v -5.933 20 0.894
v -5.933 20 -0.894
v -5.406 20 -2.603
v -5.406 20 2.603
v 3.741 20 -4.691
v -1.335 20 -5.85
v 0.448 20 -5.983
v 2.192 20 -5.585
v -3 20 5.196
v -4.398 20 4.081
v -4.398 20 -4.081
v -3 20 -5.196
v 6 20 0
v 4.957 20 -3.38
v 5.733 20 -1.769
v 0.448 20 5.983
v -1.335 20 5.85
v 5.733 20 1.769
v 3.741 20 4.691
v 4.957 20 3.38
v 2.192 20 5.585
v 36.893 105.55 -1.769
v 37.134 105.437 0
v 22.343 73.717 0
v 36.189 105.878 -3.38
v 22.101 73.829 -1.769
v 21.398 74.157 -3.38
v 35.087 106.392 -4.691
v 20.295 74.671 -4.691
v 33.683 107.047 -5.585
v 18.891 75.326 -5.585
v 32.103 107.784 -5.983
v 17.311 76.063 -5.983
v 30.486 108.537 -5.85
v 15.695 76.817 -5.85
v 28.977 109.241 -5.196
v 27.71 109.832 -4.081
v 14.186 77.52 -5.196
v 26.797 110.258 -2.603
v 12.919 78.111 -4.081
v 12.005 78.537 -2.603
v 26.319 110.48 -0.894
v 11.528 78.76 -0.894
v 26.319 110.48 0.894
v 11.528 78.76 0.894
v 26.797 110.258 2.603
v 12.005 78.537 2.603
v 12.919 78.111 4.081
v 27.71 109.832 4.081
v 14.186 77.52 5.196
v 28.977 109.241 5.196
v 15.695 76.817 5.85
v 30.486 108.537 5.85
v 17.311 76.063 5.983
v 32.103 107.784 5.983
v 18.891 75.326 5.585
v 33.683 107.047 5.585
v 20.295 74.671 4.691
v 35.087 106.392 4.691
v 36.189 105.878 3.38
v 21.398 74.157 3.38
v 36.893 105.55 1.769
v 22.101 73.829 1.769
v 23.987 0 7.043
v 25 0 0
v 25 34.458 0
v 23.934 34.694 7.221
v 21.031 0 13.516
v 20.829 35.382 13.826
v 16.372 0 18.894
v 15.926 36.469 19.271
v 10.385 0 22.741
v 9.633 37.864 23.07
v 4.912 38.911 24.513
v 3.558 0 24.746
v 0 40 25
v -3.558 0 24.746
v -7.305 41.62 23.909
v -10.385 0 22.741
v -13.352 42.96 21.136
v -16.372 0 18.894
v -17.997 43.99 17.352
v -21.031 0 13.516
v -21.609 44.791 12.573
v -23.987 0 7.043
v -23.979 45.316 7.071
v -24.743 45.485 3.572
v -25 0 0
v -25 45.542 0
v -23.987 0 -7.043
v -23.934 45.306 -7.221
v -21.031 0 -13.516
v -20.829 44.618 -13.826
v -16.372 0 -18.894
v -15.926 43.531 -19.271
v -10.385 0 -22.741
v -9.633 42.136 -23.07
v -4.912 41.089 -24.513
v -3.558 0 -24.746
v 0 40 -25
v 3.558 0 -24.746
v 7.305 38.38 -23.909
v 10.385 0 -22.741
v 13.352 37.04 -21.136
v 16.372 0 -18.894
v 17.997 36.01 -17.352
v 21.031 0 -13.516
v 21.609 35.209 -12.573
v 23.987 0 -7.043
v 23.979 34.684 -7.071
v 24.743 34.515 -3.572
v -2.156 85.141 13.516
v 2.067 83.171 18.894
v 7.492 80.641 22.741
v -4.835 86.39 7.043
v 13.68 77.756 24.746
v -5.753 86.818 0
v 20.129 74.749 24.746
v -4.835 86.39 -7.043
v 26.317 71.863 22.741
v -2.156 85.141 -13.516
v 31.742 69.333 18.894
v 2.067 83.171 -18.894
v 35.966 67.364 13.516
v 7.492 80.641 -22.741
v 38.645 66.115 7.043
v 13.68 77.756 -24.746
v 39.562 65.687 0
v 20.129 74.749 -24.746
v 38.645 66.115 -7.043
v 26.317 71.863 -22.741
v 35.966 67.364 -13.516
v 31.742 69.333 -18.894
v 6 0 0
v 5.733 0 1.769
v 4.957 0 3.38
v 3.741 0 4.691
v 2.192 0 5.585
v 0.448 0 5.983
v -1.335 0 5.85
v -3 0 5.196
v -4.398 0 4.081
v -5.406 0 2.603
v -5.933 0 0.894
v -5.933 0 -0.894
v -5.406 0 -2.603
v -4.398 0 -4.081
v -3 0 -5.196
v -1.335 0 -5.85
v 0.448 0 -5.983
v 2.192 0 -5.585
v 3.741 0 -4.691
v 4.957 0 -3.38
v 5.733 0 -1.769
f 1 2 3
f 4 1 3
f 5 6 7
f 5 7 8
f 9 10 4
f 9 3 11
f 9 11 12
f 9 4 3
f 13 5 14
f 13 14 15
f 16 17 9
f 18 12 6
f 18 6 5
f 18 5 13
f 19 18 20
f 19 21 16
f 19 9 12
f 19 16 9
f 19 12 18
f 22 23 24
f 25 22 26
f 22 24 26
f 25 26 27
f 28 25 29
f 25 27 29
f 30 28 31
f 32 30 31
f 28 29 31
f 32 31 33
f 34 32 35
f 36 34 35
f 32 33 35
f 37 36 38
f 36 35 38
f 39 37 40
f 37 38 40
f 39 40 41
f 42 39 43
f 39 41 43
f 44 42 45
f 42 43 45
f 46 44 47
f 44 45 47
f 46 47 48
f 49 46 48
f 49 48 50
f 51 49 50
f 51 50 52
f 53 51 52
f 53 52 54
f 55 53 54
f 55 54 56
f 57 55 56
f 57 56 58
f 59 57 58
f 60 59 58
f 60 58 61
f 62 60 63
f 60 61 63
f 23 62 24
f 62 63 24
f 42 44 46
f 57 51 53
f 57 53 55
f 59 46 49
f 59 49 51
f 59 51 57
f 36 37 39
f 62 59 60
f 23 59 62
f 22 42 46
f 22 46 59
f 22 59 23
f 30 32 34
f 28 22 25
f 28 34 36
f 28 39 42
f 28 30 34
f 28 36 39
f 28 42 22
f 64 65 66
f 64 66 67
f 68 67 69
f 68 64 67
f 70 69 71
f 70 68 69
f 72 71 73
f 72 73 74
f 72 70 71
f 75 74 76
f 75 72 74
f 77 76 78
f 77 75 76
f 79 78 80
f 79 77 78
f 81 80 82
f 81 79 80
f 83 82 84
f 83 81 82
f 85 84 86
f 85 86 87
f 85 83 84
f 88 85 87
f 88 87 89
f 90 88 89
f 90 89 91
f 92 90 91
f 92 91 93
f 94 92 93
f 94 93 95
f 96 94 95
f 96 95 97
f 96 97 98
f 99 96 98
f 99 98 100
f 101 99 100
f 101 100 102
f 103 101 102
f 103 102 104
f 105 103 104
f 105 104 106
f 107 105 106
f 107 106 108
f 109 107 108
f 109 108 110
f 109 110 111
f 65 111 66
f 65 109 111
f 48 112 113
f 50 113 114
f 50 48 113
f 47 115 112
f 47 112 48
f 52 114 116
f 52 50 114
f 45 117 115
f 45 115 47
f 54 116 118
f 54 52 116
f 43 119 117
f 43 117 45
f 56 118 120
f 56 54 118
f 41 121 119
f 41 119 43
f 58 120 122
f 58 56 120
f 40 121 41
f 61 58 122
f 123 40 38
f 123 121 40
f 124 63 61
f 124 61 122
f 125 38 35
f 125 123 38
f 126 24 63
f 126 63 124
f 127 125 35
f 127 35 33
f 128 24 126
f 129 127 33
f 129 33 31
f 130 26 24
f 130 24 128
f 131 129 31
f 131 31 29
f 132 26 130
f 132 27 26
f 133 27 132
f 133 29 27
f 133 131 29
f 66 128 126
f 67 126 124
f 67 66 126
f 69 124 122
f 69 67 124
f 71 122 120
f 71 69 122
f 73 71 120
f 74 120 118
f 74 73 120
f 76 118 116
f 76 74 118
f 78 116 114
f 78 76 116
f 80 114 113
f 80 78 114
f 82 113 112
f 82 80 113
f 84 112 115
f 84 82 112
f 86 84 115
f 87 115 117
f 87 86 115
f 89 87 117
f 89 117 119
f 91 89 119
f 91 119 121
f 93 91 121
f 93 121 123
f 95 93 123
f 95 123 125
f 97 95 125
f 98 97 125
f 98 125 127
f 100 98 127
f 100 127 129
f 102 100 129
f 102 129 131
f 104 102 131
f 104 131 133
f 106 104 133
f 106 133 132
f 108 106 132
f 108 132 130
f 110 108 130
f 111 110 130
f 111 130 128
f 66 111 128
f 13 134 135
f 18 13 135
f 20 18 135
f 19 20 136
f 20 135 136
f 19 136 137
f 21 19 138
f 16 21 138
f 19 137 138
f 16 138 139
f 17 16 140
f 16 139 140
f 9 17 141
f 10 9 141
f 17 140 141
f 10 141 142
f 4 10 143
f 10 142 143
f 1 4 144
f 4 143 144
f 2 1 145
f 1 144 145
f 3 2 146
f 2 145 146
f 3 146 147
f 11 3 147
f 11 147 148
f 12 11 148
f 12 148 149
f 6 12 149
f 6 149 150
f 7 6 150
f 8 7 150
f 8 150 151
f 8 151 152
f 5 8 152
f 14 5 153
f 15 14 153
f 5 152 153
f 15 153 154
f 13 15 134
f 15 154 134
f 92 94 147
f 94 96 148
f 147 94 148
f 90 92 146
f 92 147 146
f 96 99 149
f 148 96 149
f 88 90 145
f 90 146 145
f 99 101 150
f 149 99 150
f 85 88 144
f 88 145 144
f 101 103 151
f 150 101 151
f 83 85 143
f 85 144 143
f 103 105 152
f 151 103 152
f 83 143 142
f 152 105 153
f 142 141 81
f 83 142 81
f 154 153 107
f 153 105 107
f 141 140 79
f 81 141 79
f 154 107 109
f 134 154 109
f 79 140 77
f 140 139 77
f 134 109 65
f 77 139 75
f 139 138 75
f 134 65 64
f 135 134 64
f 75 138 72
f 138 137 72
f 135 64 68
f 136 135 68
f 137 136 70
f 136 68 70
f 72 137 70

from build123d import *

# Parameters (mm, degrees)
ESBO_O2_R                = 25
ESBO_O3_R                = 6
RESSALTO_EXTRUS_O1_DEPTH = 35
ESBO_O4_R                = 6
CORTE_EXTRUS_O1_DEPTH    = 20


with BuildPart() as part:
    # Varredura1: sweep along a path in Esboço1
    with BuildLine(Plane.XY) as varredura1_path:
        Line((16.90473047, 76.252311481), (0, 40))
        Line((0, 40), (0, 0))
    # Esboço2 → Varredura1 (sweep)
    with BuildSketch(Plane(origin=(0, 0, 0), x_dir=(1, 0, 0), z_dir=(0, 1, 0))):
        Circle(ESBO_O2_R)
    sweep(path=varredura1_path.line, transition=Transition.RIGHT)

    # Esboço3 → Ressalto-extrusão1 (add)
    with BuildSketch(Plane(origin=(32.225619332, 69.108063675, 0), x_dir=(0.906307787, -0.422618262, 0), z_dir=(0.422618262, 0.906307787, 0))):
        with Locations((-16.90473047, 0)):
            Circle(ESBO_O3_R)
    extrude(amount=RESSALTO_EXTRUS_O1_DEPTH)

    # Esboço4 → Corte-extrusão1 (cut)
    with BuildSketch(Plane.XZ):
        Circle(ESBO_O4_R)
    extrude(amount=-CORTE_EXTRUS_O1_DEPTH, mode=Mode.SUBTRACT)


solid = part.part
